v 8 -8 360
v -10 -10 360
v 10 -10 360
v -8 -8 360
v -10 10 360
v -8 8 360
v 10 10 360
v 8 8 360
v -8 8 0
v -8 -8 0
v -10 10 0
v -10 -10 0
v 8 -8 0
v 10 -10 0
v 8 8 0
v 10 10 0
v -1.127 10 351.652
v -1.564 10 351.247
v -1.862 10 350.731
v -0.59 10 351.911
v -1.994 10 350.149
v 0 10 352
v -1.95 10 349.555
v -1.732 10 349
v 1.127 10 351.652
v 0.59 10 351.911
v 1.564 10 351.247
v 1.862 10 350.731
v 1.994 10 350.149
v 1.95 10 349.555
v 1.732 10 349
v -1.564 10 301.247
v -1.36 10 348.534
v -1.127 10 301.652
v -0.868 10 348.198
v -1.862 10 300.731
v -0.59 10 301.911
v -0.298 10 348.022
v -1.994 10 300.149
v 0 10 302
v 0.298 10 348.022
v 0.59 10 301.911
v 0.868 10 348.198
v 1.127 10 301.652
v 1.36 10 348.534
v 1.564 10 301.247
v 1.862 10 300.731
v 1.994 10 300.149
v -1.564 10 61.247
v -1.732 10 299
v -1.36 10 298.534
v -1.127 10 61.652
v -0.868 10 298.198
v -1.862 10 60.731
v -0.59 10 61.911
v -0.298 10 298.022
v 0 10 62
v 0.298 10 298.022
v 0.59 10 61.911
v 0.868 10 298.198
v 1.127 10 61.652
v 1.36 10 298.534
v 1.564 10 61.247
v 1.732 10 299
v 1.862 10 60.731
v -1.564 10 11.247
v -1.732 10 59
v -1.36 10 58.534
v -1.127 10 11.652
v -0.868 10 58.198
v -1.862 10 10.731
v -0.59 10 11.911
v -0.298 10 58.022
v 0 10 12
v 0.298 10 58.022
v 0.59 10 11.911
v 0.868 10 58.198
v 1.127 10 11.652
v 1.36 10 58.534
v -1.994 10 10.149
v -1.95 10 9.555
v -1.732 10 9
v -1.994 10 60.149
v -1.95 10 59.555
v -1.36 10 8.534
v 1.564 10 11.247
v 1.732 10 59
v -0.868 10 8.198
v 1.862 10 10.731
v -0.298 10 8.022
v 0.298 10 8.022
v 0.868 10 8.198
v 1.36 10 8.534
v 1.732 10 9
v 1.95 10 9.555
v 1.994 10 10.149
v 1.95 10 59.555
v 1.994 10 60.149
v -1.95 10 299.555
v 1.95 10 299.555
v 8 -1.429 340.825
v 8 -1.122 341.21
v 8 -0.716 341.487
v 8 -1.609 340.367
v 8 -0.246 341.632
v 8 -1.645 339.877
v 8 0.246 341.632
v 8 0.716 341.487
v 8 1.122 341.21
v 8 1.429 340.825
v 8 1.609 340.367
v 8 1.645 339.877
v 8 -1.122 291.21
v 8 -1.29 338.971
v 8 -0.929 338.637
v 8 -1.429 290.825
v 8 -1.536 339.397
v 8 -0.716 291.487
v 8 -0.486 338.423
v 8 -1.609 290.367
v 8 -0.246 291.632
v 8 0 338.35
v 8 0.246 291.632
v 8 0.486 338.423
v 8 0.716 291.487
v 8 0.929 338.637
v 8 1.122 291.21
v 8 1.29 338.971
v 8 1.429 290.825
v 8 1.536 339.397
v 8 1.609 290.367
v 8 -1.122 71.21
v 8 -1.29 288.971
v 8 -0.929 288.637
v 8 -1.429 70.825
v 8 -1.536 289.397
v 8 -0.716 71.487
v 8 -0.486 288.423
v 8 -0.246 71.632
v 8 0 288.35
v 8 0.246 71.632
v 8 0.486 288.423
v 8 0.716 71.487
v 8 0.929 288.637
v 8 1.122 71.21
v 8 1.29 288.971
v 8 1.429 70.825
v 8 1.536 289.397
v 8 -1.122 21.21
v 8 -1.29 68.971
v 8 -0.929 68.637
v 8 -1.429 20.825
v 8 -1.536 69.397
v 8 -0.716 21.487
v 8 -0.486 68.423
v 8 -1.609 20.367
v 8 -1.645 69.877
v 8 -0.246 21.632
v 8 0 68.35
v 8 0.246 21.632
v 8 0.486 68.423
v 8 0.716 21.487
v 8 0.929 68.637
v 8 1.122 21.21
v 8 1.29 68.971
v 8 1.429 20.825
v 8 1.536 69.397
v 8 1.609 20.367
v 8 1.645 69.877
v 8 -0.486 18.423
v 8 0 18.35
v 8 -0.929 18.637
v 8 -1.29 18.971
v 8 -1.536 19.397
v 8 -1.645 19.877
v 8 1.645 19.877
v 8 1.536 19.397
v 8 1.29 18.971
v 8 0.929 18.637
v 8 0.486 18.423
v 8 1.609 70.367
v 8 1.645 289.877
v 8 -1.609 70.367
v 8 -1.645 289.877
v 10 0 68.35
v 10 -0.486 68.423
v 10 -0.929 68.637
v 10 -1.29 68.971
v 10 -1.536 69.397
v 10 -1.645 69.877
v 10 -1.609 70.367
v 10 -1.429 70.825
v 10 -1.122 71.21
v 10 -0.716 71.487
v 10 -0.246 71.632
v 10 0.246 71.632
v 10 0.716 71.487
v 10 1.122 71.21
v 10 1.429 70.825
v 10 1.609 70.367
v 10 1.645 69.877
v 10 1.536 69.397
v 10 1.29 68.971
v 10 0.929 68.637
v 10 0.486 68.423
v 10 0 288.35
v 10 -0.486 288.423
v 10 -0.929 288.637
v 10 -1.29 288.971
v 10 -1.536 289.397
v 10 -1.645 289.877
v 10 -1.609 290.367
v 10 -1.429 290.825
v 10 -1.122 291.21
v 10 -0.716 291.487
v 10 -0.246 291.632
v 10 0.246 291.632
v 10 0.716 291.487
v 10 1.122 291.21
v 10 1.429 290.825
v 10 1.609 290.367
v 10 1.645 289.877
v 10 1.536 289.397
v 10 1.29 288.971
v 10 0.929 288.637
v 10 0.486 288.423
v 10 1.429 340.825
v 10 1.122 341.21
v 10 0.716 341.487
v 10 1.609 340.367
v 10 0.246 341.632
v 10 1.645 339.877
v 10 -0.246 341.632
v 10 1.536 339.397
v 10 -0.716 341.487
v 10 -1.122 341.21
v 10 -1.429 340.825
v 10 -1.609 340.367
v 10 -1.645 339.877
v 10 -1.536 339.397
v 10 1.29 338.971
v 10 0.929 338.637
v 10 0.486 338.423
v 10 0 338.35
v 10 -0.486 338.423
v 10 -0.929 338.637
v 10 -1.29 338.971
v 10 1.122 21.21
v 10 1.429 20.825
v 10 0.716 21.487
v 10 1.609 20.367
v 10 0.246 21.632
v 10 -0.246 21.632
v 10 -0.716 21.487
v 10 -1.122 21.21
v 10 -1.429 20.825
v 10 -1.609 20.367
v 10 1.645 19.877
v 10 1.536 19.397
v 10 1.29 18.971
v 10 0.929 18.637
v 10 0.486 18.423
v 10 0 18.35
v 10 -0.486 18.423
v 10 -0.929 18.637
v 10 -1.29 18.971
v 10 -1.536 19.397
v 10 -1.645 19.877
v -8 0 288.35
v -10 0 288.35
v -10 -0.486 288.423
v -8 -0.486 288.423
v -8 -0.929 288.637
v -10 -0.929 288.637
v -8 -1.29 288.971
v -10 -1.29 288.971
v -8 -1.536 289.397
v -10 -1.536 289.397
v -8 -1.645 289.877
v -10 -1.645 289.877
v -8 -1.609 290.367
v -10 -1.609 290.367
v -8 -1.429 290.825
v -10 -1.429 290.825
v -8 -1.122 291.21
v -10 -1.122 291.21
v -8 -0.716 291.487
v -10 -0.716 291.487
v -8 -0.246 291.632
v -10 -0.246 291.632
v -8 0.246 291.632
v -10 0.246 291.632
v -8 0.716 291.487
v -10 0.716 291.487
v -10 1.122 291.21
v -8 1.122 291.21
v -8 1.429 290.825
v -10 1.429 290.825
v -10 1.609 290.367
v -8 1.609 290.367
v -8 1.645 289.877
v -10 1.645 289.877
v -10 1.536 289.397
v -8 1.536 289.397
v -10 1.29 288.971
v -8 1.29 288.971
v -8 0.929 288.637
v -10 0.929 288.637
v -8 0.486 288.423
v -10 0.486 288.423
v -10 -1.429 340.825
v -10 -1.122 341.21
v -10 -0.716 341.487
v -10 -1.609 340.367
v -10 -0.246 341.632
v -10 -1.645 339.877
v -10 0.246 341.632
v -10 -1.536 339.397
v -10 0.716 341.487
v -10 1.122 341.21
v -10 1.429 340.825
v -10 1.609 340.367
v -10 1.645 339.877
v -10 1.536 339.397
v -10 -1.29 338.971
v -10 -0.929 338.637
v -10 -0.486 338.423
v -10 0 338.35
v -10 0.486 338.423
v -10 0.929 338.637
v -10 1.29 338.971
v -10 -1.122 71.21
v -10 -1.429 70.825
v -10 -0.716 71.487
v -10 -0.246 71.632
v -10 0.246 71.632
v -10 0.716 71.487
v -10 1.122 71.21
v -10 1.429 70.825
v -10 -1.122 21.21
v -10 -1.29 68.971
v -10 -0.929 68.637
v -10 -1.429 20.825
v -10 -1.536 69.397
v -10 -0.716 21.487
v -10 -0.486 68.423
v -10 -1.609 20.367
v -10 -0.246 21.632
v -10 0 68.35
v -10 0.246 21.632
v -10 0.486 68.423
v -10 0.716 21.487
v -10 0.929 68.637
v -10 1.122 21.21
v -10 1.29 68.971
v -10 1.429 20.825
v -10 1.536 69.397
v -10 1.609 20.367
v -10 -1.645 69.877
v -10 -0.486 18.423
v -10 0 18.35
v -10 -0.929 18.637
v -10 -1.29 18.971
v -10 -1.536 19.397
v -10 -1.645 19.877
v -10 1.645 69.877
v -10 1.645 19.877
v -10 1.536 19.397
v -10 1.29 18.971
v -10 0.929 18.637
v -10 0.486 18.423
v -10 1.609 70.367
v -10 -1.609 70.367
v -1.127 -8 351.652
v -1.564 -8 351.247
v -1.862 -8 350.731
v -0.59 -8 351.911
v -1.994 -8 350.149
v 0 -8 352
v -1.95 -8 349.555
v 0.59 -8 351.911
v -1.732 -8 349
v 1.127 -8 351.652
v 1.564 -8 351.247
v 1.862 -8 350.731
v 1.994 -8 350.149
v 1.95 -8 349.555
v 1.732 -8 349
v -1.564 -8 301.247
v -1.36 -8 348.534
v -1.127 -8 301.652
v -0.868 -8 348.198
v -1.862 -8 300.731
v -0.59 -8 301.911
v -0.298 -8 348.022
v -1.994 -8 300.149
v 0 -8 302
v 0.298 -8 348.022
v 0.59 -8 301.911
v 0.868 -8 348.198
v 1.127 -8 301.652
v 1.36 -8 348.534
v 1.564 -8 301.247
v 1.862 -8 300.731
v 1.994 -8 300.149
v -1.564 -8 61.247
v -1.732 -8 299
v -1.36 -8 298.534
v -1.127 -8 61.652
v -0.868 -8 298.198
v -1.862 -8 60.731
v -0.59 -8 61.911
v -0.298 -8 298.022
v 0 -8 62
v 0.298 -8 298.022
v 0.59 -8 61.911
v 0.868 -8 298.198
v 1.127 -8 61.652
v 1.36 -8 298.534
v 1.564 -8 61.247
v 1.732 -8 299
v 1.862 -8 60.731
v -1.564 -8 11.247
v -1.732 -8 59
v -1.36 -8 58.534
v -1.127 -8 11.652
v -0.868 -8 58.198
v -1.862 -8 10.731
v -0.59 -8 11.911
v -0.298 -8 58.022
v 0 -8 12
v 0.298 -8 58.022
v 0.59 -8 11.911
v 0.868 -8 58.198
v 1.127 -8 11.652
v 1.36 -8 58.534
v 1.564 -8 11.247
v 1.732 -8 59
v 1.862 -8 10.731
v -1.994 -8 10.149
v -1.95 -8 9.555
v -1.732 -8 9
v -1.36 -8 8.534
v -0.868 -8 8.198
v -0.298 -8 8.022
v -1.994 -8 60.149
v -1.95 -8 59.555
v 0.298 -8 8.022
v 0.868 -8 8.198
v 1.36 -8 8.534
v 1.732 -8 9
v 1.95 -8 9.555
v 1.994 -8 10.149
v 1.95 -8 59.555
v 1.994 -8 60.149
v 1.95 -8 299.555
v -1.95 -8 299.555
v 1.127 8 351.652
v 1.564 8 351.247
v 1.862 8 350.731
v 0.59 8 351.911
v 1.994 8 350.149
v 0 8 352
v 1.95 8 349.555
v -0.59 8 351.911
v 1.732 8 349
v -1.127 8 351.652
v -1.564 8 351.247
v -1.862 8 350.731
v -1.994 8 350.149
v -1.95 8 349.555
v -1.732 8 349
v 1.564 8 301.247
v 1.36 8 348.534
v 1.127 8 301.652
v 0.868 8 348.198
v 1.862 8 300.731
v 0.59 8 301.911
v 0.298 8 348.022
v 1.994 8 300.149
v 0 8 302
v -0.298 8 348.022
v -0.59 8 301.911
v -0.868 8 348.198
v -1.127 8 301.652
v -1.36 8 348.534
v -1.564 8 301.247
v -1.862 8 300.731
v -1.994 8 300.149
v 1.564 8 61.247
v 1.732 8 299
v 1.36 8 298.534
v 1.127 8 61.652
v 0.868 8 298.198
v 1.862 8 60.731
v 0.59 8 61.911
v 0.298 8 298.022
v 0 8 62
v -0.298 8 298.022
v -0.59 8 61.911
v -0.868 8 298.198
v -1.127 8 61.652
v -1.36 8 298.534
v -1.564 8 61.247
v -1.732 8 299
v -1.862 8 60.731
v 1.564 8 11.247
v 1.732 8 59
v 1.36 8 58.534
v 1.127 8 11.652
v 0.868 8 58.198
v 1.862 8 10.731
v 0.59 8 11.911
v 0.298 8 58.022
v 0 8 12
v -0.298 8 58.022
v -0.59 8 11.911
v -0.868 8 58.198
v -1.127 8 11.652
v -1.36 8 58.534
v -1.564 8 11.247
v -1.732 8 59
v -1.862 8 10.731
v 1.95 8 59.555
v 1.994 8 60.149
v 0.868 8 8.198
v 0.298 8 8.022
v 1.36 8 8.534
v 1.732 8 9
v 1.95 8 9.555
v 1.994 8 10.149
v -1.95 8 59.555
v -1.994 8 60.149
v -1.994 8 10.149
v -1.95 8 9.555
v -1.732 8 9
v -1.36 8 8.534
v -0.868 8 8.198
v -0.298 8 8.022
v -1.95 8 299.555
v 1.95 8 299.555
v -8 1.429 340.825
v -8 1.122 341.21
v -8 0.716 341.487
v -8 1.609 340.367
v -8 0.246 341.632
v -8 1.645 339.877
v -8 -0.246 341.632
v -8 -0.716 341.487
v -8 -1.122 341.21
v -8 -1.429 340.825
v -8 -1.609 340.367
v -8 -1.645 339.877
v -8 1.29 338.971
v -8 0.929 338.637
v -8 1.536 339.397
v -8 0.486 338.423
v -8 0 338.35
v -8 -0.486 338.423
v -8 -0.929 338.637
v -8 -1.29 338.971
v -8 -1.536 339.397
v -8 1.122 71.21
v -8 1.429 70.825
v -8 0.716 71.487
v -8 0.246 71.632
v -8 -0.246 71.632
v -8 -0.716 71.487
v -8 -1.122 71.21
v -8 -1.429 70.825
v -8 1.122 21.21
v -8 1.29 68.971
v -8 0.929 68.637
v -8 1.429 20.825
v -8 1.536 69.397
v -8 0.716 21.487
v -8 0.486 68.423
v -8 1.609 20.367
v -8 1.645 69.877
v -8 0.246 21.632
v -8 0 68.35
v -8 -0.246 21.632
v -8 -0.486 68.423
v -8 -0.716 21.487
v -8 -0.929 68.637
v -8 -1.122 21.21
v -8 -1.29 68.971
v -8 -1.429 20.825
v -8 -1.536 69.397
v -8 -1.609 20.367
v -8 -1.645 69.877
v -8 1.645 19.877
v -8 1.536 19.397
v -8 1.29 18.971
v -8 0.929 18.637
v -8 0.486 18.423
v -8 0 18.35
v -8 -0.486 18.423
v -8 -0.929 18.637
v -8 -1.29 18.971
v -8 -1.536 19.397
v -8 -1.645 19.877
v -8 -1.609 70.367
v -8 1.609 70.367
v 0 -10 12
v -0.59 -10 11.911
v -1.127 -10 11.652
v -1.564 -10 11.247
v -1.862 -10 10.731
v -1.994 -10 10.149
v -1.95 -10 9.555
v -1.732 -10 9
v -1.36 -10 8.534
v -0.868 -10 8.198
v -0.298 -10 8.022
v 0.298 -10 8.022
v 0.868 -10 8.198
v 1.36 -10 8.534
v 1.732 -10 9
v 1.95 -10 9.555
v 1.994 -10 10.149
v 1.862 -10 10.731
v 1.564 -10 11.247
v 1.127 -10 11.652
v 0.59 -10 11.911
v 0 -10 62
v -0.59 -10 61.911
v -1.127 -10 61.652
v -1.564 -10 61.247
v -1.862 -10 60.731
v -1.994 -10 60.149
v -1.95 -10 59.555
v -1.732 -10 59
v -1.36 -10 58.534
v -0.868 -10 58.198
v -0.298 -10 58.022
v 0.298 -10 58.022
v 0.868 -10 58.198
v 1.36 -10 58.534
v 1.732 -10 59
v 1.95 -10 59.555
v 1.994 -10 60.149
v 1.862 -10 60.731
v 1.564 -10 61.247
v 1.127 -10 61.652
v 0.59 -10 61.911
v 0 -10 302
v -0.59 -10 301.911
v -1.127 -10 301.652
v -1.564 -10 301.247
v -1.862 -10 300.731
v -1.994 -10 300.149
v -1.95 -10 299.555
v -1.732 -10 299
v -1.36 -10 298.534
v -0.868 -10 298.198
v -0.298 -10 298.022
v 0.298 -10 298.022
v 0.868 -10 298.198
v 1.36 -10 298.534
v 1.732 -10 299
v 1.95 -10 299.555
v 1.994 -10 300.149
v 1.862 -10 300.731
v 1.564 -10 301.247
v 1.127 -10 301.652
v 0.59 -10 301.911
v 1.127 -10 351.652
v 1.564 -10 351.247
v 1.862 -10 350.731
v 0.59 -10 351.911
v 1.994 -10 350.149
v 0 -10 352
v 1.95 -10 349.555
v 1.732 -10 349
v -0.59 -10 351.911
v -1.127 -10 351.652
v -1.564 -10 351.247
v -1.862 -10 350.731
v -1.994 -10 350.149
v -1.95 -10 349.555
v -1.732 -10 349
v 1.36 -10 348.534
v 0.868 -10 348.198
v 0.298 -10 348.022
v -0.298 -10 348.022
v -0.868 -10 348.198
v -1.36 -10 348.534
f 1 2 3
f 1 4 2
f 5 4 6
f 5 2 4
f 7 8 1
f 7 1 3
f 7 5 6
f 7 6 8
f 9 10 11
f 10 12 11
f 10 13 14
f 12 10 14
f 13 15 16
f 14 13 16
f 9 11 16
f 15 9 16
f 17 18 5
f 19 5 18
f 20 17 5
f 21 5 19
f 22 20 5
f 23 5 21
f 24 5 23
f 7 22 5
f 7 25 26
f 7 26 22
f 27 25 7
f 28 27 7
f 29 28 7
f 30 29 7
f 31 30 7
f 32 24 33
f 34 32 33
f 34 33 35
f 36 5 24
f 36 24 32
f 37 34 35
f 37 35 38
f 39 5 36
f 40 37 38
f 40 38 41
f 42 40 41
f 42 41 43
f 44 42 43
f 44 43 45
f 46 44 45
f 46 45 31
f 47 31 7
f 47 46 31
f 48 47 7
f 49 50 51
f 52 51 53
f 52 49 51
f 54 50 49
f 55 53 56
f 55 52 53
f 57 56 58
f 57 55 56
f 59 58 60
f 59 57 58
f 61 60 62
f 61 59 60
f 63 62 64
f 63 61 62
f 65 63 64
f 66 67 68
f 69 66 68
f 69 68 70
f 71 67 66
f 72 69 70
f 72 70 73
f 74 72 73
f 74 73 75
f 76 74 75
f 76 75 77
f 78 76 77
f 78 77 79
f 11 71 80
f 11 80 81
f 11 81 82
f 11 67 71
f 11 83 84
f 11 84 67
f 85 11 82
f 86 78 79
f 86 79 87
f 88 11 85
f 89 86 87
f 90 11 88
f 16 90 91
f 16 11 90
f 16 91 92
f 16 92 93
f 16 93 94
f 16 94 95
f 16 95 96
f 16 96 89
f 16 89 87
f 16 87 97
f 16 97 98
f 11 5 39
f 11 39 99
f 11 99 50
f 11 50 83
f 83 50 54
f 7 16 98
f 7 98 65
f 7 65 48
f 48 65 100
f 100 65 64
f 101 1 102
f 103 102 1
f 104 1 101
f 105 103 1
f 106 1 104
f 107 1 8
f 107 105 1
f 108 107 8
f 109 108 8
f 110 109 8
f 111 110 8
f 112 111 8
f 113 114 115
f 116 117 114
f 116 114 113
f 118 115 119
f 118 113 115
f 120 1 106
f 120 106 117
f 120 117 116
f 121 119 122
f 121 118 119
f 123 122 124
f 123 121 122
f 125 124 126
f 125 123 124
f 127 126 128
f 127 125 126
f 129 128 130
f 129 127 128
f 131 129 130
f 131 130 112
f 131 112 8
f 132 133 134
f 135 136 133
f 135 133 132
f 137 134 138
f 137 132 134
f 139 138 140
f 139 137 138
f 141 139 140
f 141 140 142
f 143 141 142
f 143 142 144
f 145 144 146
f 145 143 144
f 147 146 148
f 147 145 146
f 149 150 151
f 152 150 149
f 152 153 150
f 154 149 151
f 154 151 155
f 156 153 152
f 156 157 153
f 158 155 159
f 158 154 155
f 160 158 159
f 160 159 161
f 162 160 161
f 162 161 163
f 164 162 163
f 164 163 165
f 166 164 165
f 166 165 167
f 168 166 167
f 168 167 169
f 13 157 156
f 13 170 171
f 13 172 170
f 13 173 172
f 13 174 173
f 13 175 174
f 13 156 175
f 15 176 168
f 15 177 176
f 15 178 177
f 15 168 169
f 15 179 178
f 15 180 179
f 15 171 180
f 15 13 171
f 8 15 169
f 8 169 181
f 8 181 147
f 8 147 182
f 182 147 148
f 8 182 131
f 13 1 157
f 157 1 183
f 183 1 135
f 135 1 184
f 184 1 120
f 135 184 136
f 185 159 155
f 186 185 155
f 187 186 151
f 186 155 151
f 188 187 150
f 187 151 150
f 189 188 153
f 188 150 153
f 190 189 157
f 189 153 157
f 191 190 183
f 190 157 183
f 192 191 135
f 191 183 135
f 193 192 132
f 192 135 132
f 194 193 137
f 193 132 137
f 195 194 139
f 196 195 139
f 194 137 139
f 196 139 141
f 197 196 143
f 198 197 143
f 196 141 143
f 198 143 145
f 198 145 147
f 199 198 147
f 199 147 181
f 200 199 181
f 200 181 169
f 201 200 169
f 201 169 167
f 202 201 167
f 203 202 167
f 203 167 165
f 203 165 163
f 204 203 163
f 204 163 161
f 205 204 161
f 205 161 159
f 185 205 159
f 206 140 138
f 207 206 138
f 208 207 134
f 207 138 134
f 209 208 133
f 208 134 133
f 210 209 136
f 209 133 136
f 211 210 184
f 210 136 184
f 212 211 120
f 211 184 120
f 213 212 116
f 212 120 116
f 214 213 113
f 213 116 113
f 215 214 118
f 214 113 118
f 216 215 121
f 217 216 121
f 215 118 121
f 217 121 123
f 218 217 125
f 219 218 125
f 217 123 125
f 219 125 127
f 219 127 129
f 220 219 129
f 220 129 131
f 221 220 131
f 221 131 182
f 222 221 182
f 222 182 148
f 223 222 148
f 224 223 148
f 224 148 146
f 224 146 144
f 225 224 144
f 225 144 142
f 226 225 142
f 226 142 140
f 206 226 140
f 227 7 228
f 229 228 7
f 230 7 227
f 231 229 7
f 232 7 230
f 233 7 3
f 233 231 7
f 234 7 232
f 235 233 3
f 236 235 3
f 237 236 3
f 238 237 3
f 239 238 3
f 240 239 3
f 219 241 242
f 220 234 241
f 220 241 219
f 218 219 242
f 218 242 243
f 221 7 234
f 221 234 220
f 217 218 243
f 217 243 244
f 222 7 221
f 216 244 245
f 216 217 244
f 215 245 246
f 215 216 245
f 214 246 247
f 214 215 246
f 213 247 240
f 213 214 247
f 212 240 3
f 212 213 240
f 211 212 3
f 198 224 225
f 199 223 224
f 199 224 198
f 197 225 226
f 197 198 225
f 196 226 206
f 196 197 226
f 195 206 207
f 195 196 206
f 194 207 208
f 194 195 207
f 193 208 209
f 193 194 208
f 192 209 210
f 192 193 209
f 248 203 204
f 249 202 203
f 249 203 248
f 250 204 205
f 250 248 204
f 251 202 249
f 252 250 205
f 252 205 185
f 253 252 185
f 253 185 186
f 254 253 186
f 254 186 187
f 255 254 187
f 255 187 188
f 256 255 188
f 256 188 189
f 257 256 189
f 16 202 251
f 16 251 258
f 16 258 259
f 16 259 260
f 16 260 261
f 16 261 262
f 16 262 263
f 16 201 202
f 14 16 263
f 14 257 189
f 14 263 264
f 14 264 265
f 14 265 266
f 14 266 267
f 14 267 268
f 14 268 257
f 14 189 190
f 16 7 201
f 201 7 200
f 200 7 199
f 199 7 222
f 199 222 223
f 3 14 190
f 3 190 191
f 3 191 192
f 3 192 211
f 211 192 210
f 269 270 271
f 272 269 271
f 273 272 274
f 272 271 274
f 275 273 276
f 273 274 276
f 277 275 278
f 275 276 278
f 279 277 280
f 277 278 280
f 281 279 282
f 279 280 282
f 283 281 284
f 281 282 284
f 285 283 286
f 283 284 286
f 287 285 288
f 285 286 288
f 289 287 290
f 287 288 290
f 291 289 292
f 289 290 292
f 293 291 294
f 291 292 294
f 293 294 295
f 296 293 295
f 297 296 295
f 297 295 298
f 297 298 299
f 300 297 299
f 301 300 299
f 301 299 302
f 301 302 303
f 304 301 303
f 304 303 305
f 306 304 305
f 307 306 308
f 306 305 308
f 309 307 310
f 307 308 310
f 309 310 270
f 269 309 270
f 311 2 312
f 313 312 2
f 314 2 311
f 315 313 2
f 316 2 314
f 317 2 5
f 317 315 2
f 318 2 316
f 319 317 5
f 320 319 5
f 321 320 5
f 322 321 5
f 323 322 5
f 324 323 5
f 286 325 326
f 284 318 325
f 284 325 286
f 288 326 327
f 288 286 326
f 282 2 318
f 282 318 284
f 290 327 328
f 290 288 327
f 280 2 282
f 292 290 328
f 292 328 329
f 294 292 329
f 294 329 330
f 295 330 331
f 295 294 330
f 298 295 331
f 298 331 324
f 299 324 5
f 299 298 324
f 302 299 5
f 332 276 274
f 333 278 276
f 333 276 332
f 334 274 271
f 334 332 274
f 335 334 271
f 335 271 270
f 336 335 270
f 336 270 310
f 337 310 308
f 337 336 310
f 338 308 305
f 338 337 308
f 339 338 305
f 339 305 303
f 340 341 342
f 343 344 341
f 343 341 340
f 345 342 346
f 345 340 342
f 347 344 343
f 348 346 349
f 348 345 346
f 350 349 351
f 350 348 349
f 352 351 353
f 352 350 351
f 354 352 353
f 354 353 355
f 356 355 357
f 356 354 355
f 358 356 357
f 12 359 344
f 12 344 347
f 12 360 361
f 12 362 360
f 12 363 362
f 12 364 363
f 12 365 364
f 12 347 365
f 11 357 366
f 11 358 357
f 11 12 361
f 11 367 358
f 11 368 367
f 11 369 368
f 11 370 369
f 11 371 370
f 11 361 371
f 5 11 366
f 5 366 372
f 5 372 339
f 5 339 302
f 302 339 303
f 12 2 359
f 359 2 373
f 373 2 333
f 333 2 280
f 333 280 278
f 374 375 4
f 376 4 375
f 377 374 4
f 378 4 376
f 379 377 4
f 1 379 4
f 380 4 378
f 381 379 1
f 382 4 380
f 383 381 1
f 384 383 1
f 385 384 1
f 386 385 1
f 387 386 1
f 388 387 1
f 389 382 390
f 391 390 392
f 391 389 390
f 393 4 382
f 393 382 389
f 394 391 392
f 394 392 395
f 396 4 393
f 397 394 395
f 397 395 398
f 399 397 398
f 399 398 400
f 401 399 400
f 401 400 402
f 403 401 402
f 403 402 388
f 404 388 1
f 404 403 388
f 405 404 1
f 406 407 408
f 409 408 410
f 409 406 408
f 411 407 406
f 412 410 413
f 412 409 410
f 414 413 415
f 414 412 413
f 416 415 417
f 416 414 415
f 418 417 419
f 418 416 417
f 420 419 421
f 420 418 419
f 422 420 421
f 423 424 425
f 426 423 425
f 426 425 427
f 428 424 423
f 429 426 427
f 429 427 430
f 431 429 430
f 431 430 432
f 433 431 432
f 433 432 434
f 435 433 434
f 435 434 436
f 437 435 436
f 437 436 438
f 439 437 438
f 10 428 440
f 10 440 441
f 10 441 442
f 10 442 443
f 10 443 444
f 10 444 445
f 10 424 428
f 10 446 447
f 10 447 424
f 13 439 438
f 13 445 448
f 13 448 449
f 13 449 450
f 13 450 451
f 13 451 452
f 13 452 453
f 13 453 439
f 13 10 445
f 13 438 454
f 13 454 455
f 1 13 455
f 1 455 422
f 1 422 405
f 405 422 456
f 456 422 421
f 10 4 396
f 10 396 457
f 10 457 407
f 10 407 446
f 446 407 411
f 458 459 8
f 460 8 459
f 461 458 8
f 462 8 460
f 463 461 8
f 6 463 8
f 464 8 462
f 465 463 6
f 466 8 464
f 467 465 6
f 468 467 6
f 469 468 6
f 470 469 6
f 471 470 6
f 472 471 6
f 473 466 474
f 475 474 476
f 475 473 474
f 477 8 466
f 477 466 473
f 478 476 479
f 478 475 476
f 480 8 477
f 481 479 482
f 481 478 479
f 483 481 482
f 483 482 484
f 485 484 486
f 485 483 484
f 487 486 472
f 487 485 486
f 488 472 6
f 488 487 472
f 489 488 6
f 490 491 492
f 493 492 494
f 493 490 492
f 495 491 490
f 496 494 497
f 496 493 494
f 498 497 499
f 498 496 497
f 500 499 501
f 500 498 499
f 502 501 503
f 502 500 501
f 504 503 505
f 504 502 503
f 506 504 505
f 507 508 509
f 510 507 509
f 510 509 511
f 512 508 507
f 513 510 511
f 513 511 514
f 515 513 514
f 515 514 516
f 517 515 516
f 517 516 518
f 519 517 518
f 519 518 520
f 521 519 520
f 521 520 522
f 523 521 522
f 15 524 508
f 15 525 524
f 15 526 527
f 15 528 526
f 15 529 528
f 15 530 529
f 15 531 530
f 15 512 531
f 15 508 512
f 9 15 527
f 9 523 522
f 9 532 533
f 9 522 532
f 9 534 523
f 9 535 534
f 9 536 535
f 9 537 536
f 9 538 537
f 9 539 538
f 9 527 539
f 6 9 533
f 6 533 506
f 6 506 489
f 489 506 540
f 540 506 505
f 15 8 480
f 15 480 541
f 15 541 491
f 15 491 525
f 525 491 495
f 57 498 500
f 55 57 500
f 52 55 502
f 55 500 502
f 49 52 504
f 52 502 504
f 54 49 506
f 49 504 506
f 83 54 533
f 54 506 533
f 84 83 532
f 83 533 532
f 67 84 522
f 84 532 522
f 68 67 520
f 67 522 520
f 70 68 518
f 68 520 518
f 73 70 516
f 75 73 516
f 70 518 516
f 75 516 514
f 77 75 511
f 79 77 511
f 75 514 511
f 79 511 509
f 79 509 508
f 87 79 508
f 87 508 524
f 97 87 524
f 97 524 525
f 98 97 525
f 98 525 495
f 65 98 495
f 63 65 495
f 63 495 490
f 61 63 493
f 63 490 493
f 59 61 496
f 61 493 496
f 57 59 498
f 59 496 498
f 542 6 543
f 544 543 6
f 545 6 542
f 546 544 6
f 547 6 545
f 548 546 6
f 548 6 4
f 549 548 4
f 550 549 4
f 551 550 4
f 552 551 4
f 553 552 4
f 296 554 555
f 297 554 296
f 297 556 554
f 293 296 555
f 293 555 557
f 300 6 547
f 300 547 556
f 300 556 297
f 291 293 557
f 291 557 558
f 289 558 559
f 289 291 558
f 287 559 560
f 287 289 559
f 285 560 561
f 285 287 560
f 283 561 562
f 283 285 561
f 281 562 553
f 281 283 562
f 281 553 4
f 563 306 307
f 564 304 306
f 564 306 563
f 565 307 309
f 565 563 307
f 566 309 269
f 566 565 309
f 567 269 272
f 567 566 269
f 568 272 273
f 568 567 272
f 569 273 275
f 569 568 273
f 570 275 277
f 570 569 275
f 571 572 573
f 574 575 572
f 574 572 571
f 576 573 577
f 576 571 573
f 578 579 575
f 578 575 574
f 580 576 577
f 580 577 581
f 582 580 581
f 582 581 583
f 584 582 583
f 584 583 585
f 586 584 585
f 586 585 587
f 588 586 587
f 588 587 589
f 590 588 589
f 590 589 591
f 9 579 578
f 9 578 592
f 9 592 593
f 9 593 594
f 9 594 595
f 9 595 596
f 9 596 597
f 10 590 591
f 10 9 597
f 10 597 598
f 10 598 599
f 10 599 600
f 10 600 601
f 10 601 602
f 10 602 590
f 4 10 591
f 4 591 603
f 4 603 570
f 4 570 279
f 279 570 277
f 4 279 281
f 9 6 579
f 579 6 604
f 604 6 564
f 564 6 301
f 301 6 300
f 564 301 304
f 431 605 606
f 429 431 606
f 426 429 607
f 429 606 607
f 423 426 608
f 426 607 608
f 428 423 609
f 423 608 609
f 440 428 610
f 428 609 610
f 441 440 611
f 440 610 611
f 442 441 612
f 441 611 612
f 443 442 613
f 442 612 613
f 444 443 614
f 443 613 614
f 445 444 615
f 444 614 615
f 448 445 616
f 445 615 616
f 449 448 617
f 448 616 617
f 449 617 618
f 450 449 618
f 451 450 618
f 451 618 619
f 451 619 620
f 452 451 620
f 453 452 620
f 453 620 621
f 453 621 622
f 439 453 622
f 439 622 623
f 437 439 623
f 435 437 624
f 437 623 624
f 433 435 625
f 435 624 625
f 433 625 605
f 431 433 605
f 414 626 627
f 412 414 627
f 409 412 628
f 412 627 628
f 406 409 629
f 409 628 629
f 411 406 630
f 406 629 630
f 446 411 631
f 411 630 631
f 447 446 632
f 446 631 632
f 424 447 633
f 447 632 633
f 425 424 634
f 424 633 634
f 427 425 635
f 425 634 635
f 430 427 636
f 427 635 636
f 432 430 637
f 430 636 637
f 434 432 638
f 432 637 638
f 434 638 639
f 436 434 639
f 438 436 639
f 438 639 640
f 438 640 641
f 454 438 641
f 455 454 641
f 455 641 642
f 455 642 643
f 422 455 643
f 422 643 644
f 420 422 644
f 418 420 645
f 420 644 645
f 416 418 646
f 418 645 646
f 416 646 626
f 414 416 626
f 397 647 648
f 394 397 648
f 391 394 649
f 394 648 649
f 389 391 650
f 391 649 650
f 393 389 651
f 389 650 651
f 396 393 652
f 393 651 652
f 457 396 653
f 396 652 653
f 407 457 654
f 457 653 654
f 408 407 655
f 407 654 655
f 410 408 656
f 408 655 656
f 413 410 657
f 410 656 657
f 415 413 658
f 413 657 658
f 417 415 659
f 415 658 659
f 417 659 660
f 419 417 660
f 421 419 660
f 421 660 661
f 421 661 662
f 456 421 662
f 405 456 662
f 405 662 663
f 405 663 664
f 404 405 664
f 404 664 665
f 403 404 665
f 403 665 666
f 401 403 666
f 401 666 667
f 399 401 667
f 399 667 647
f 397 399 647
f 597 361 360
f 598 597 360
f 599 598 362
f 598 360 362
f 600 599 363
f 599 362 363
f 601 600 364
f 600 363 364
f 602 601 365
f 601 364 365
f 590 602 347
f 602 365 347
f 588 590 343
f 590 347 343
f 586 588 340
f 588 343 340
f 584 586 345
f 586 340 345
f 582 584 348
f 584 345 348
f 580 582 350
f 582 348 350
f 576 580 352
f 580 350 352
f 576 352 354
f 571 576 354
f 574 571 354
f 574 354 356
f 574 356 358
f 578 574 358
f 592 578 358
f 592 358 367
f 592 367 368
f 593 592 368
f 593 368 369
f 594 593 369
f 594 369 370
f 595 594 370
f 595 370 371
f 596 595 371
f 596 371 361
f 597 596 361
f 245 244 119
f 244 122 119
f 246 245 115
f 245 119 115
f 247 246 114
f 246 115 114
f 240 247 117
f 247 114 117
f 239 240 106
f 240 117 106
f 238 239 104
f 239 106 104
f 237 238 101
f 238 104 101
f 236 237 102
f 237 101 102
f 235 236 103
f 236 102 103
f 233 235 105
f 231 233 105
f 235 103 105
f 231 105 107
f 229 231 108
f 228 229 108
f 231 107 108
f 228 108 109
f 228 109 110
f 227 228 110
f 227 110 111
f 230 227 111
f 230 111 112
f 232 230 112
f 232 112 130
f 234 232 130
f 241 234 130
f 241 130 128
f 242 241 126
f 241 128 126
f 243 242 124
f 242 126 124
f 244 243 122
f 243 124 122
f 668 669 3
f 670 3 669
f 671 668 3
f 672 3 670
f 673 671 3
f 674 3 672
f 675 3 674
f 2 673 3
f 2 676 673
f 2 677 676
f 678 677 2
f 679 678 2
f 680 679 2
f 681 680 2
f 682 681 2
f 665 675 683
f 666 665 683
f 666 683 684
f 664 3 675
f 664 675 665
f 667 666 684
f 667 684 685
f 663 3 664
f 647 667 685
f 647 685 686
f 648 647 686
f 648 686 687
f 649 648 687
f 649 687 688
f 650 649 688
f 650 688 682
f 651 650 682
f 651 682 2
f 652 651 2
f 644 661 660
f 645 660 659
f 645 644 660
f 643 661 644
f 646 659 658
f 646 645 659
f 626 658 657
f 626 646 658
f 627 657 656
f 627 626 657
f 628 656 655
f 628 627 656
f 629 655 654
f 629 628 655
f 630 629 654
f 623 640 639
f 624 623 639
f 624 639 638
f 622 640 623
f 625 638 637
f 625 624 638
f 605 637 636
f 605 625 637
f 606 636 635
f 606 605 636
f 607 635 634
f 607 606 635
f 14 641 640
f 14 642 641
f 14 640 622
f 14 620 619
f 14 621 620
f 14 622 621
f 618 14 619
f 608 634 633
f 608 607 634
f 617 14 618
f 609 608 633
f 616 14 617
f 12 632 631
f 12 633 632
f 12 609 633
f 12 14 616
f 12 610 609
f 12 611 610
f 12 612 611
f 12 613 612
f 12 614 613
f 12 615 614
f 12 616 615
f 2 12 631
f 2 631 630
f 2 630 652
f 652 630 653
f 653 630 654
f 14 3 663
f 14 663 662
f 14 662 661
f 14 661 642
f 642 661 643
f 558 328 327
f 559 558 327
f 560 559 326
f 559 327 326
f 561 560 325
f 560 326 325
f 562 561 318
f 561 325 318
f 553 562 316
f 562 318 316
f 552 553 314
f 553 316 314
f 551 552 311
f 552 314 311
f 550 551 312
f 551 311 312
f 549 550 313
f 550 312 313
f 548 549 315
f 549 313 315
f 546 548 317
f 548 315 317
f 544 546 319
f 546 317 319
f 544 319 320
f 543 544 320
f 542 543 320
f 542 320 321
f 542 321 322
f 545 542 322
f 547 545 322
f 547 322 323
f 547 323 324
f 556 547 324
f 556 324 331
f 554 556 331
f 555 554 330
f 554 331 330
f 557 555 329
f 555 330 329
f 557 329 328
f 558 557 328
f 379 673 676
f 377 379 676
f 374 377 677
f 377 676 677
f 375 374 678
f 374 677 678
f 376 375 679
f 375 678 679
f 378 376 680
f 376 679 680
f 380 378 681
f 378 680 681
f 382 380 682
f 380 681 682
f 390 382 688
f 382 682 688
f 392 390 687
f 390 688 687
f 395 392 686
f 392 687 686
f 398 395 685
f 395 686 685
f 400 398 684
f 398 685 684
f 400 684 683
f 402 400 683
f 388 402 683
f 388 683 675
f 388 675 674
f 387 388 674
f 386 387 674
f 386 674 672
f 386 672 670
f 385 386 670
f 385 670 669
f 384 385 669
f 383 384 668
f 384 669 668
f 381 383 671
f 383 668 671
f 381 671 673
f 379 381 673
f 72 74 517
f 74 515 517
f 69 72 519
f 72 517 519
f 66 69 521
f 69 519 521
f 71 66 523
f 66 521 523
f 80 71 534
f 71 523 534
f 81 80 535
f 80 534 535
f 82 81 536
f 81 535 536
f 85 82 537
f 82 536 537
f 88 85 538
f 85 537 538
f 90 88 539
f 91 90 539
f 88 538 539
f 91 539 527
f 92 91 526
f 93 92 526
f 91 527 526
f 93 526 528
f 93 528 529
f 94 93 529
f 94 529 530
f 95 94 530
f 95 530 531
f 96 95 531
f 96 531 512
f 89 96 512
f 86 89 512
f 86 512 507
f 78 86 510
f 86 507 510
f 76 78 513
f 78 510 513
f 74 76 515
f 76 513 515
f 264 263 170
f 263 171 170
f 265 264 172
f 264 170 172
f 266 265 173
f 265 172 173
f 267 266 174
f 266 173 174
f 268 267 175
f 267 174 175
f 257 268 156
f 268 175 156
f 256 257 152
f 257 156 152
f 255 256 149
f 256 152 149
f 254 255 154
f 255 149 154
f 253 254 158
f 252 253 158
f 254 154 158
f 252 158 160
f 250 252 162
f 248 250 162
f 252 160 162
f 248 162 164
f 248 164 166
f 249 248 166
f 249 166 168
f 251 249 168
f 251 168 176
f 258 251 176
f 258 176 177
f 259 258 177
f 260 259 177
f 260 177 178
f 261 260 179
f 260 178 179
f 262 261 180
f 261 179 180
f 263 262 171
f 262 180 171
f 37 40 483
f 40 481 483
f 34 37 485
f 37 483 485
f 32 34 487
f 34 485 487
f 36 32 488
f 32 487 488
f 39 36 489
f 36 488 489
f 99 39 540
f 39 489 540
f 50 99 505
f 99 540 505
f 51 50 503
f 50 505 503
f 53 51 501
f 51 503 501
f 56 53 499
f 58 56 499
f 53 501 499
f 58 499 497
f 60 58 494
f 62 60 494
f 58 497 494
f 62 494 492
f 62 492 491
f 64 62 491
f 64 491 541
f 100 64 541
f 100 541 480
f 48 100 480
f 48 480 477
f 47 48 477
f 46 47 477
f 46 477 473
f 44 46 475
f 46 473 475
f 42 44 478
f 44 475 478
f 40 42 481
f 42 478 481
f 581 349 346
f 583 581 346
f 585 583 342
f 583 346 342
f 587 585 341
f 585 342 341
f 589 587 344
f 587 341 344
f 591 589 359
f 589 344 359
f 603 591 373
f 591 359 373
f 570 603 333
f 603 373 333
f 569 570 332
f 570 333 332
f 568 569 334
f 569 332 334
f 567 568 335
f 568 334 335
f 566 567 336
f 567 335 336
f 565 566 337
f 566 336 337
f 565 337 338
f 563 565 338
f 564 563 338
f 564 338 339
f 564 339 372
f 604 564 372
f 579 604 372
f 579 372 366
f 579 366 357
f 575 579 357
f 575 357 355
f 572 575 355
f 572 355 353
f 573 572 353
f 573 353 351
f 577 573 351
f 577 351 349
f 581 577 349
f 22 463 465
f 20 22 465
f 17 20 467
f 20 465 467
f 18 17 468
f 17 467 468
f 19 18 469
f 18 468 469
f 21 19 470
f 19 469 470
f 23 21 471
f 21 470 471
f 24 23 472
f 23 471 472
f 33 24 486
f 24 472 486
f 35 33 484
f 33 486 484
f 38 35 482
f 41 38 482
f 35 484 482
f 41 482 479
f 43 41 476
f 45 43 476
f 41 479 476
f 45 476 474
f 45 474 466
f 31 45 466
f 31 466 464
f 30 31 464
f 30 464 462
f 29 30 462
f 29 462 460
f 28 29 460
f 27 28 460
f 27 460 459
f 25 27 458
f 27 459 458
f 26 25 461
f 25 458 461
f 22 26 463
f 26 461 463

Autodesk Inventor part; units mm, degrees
ref_plane "YZ Plane" through (0, 0, 0) normal (1, 0, 0) x (0, 1, 0)
ref_plane "XZ Plane" through (0, 0, 0) normal (0, 1, 0) x (-1, 0, 0)
ref_plane "XY Plane" through (0, 0, 0) normal (0, 0, 1) x (1, 0, 0)
sketch "スケッチ1" plane through (0, 0, 0) normal (0, 0, 1) x (1, 0, 0)
  line L0 (10, -10) -> (-10, -10)
  line L1 (-10, -10) -> (-10, 10)
  line L2 (-10, 10) -> (10, 10)
  line L3 (10, 10) -> (10, -10)
  line L4 (10, -10) -> (-10, 10) construction
  line L5 (-10, -10) -> (10, 10) construction
  line L6 (8, 8) -> (-8, 8)
  line L7 (-8, 8) -> (-8, -8)
  line L8 (-8, -8) -> (8, -8)
  line L9 (8, -8) -> (8, 8)
  point P0 (0, 0)
  dimension "d0" = 20
  dimension "d1" = 20
  dimension "d2" = 2
extrude "押し出し1" add sketch "スケッチ1" along normal blind 360
sketch "スケッチ2" plane through (-10, 10, 0) normal (0, 1, 0) x (1, 0, 0)
  line L0 (10, 0) -> (10, -360)
  line L1 (2, -360) -> (18, -360) projected
  line L2 (20, 0) -> (0, 0) projected
  point P0 (10, -350)
  point P1 (10, -300)
  point P2 (10, -60)
  point P3 (10, -10)
  dimension "d5" = 10
  dimension "d6" = 50
  dimension "d7" = 50
  dimension "d9" = 10
hole "穴1" at (0, 10, 350) at (0, 10, 300) at (0, 10, 60) at (0, 10, 10) direction (0, -1, 0) diameter 4 end through all
sketch "スケッチ3" plane through (10, -10, 0) normal (1, 0, 0) x (0, 0, -1)
  line L0 (0, 10) -> (-360, 10)
  line L1 (-360, 20) -> (-360, 0) projected
  line L2 (0, 0) -> (0, 20) projected
  point P0 (-340, 10)
  point P1 (-290, 10)
  point P2 (-20, 10)
  point P3 (-70, 10)
  dimension "d17" = 20
  dimension "d18" = 50
  dimension "d19" = 20
  dimension "d20" = 50
hole "穴2" at (10, 0, 340) at (10, 0, 290) at (10, 0, 20) at (10, 0, 70) direction (-1, 0, 0) diameter 3.3 end through all
equation "\"d7\" = d6"
equation "\"d9\" = d5"
equation "\"d19\" = d17"
equation "\"d20\" = d18"
properties part number "small_kaku_2020_tka"
